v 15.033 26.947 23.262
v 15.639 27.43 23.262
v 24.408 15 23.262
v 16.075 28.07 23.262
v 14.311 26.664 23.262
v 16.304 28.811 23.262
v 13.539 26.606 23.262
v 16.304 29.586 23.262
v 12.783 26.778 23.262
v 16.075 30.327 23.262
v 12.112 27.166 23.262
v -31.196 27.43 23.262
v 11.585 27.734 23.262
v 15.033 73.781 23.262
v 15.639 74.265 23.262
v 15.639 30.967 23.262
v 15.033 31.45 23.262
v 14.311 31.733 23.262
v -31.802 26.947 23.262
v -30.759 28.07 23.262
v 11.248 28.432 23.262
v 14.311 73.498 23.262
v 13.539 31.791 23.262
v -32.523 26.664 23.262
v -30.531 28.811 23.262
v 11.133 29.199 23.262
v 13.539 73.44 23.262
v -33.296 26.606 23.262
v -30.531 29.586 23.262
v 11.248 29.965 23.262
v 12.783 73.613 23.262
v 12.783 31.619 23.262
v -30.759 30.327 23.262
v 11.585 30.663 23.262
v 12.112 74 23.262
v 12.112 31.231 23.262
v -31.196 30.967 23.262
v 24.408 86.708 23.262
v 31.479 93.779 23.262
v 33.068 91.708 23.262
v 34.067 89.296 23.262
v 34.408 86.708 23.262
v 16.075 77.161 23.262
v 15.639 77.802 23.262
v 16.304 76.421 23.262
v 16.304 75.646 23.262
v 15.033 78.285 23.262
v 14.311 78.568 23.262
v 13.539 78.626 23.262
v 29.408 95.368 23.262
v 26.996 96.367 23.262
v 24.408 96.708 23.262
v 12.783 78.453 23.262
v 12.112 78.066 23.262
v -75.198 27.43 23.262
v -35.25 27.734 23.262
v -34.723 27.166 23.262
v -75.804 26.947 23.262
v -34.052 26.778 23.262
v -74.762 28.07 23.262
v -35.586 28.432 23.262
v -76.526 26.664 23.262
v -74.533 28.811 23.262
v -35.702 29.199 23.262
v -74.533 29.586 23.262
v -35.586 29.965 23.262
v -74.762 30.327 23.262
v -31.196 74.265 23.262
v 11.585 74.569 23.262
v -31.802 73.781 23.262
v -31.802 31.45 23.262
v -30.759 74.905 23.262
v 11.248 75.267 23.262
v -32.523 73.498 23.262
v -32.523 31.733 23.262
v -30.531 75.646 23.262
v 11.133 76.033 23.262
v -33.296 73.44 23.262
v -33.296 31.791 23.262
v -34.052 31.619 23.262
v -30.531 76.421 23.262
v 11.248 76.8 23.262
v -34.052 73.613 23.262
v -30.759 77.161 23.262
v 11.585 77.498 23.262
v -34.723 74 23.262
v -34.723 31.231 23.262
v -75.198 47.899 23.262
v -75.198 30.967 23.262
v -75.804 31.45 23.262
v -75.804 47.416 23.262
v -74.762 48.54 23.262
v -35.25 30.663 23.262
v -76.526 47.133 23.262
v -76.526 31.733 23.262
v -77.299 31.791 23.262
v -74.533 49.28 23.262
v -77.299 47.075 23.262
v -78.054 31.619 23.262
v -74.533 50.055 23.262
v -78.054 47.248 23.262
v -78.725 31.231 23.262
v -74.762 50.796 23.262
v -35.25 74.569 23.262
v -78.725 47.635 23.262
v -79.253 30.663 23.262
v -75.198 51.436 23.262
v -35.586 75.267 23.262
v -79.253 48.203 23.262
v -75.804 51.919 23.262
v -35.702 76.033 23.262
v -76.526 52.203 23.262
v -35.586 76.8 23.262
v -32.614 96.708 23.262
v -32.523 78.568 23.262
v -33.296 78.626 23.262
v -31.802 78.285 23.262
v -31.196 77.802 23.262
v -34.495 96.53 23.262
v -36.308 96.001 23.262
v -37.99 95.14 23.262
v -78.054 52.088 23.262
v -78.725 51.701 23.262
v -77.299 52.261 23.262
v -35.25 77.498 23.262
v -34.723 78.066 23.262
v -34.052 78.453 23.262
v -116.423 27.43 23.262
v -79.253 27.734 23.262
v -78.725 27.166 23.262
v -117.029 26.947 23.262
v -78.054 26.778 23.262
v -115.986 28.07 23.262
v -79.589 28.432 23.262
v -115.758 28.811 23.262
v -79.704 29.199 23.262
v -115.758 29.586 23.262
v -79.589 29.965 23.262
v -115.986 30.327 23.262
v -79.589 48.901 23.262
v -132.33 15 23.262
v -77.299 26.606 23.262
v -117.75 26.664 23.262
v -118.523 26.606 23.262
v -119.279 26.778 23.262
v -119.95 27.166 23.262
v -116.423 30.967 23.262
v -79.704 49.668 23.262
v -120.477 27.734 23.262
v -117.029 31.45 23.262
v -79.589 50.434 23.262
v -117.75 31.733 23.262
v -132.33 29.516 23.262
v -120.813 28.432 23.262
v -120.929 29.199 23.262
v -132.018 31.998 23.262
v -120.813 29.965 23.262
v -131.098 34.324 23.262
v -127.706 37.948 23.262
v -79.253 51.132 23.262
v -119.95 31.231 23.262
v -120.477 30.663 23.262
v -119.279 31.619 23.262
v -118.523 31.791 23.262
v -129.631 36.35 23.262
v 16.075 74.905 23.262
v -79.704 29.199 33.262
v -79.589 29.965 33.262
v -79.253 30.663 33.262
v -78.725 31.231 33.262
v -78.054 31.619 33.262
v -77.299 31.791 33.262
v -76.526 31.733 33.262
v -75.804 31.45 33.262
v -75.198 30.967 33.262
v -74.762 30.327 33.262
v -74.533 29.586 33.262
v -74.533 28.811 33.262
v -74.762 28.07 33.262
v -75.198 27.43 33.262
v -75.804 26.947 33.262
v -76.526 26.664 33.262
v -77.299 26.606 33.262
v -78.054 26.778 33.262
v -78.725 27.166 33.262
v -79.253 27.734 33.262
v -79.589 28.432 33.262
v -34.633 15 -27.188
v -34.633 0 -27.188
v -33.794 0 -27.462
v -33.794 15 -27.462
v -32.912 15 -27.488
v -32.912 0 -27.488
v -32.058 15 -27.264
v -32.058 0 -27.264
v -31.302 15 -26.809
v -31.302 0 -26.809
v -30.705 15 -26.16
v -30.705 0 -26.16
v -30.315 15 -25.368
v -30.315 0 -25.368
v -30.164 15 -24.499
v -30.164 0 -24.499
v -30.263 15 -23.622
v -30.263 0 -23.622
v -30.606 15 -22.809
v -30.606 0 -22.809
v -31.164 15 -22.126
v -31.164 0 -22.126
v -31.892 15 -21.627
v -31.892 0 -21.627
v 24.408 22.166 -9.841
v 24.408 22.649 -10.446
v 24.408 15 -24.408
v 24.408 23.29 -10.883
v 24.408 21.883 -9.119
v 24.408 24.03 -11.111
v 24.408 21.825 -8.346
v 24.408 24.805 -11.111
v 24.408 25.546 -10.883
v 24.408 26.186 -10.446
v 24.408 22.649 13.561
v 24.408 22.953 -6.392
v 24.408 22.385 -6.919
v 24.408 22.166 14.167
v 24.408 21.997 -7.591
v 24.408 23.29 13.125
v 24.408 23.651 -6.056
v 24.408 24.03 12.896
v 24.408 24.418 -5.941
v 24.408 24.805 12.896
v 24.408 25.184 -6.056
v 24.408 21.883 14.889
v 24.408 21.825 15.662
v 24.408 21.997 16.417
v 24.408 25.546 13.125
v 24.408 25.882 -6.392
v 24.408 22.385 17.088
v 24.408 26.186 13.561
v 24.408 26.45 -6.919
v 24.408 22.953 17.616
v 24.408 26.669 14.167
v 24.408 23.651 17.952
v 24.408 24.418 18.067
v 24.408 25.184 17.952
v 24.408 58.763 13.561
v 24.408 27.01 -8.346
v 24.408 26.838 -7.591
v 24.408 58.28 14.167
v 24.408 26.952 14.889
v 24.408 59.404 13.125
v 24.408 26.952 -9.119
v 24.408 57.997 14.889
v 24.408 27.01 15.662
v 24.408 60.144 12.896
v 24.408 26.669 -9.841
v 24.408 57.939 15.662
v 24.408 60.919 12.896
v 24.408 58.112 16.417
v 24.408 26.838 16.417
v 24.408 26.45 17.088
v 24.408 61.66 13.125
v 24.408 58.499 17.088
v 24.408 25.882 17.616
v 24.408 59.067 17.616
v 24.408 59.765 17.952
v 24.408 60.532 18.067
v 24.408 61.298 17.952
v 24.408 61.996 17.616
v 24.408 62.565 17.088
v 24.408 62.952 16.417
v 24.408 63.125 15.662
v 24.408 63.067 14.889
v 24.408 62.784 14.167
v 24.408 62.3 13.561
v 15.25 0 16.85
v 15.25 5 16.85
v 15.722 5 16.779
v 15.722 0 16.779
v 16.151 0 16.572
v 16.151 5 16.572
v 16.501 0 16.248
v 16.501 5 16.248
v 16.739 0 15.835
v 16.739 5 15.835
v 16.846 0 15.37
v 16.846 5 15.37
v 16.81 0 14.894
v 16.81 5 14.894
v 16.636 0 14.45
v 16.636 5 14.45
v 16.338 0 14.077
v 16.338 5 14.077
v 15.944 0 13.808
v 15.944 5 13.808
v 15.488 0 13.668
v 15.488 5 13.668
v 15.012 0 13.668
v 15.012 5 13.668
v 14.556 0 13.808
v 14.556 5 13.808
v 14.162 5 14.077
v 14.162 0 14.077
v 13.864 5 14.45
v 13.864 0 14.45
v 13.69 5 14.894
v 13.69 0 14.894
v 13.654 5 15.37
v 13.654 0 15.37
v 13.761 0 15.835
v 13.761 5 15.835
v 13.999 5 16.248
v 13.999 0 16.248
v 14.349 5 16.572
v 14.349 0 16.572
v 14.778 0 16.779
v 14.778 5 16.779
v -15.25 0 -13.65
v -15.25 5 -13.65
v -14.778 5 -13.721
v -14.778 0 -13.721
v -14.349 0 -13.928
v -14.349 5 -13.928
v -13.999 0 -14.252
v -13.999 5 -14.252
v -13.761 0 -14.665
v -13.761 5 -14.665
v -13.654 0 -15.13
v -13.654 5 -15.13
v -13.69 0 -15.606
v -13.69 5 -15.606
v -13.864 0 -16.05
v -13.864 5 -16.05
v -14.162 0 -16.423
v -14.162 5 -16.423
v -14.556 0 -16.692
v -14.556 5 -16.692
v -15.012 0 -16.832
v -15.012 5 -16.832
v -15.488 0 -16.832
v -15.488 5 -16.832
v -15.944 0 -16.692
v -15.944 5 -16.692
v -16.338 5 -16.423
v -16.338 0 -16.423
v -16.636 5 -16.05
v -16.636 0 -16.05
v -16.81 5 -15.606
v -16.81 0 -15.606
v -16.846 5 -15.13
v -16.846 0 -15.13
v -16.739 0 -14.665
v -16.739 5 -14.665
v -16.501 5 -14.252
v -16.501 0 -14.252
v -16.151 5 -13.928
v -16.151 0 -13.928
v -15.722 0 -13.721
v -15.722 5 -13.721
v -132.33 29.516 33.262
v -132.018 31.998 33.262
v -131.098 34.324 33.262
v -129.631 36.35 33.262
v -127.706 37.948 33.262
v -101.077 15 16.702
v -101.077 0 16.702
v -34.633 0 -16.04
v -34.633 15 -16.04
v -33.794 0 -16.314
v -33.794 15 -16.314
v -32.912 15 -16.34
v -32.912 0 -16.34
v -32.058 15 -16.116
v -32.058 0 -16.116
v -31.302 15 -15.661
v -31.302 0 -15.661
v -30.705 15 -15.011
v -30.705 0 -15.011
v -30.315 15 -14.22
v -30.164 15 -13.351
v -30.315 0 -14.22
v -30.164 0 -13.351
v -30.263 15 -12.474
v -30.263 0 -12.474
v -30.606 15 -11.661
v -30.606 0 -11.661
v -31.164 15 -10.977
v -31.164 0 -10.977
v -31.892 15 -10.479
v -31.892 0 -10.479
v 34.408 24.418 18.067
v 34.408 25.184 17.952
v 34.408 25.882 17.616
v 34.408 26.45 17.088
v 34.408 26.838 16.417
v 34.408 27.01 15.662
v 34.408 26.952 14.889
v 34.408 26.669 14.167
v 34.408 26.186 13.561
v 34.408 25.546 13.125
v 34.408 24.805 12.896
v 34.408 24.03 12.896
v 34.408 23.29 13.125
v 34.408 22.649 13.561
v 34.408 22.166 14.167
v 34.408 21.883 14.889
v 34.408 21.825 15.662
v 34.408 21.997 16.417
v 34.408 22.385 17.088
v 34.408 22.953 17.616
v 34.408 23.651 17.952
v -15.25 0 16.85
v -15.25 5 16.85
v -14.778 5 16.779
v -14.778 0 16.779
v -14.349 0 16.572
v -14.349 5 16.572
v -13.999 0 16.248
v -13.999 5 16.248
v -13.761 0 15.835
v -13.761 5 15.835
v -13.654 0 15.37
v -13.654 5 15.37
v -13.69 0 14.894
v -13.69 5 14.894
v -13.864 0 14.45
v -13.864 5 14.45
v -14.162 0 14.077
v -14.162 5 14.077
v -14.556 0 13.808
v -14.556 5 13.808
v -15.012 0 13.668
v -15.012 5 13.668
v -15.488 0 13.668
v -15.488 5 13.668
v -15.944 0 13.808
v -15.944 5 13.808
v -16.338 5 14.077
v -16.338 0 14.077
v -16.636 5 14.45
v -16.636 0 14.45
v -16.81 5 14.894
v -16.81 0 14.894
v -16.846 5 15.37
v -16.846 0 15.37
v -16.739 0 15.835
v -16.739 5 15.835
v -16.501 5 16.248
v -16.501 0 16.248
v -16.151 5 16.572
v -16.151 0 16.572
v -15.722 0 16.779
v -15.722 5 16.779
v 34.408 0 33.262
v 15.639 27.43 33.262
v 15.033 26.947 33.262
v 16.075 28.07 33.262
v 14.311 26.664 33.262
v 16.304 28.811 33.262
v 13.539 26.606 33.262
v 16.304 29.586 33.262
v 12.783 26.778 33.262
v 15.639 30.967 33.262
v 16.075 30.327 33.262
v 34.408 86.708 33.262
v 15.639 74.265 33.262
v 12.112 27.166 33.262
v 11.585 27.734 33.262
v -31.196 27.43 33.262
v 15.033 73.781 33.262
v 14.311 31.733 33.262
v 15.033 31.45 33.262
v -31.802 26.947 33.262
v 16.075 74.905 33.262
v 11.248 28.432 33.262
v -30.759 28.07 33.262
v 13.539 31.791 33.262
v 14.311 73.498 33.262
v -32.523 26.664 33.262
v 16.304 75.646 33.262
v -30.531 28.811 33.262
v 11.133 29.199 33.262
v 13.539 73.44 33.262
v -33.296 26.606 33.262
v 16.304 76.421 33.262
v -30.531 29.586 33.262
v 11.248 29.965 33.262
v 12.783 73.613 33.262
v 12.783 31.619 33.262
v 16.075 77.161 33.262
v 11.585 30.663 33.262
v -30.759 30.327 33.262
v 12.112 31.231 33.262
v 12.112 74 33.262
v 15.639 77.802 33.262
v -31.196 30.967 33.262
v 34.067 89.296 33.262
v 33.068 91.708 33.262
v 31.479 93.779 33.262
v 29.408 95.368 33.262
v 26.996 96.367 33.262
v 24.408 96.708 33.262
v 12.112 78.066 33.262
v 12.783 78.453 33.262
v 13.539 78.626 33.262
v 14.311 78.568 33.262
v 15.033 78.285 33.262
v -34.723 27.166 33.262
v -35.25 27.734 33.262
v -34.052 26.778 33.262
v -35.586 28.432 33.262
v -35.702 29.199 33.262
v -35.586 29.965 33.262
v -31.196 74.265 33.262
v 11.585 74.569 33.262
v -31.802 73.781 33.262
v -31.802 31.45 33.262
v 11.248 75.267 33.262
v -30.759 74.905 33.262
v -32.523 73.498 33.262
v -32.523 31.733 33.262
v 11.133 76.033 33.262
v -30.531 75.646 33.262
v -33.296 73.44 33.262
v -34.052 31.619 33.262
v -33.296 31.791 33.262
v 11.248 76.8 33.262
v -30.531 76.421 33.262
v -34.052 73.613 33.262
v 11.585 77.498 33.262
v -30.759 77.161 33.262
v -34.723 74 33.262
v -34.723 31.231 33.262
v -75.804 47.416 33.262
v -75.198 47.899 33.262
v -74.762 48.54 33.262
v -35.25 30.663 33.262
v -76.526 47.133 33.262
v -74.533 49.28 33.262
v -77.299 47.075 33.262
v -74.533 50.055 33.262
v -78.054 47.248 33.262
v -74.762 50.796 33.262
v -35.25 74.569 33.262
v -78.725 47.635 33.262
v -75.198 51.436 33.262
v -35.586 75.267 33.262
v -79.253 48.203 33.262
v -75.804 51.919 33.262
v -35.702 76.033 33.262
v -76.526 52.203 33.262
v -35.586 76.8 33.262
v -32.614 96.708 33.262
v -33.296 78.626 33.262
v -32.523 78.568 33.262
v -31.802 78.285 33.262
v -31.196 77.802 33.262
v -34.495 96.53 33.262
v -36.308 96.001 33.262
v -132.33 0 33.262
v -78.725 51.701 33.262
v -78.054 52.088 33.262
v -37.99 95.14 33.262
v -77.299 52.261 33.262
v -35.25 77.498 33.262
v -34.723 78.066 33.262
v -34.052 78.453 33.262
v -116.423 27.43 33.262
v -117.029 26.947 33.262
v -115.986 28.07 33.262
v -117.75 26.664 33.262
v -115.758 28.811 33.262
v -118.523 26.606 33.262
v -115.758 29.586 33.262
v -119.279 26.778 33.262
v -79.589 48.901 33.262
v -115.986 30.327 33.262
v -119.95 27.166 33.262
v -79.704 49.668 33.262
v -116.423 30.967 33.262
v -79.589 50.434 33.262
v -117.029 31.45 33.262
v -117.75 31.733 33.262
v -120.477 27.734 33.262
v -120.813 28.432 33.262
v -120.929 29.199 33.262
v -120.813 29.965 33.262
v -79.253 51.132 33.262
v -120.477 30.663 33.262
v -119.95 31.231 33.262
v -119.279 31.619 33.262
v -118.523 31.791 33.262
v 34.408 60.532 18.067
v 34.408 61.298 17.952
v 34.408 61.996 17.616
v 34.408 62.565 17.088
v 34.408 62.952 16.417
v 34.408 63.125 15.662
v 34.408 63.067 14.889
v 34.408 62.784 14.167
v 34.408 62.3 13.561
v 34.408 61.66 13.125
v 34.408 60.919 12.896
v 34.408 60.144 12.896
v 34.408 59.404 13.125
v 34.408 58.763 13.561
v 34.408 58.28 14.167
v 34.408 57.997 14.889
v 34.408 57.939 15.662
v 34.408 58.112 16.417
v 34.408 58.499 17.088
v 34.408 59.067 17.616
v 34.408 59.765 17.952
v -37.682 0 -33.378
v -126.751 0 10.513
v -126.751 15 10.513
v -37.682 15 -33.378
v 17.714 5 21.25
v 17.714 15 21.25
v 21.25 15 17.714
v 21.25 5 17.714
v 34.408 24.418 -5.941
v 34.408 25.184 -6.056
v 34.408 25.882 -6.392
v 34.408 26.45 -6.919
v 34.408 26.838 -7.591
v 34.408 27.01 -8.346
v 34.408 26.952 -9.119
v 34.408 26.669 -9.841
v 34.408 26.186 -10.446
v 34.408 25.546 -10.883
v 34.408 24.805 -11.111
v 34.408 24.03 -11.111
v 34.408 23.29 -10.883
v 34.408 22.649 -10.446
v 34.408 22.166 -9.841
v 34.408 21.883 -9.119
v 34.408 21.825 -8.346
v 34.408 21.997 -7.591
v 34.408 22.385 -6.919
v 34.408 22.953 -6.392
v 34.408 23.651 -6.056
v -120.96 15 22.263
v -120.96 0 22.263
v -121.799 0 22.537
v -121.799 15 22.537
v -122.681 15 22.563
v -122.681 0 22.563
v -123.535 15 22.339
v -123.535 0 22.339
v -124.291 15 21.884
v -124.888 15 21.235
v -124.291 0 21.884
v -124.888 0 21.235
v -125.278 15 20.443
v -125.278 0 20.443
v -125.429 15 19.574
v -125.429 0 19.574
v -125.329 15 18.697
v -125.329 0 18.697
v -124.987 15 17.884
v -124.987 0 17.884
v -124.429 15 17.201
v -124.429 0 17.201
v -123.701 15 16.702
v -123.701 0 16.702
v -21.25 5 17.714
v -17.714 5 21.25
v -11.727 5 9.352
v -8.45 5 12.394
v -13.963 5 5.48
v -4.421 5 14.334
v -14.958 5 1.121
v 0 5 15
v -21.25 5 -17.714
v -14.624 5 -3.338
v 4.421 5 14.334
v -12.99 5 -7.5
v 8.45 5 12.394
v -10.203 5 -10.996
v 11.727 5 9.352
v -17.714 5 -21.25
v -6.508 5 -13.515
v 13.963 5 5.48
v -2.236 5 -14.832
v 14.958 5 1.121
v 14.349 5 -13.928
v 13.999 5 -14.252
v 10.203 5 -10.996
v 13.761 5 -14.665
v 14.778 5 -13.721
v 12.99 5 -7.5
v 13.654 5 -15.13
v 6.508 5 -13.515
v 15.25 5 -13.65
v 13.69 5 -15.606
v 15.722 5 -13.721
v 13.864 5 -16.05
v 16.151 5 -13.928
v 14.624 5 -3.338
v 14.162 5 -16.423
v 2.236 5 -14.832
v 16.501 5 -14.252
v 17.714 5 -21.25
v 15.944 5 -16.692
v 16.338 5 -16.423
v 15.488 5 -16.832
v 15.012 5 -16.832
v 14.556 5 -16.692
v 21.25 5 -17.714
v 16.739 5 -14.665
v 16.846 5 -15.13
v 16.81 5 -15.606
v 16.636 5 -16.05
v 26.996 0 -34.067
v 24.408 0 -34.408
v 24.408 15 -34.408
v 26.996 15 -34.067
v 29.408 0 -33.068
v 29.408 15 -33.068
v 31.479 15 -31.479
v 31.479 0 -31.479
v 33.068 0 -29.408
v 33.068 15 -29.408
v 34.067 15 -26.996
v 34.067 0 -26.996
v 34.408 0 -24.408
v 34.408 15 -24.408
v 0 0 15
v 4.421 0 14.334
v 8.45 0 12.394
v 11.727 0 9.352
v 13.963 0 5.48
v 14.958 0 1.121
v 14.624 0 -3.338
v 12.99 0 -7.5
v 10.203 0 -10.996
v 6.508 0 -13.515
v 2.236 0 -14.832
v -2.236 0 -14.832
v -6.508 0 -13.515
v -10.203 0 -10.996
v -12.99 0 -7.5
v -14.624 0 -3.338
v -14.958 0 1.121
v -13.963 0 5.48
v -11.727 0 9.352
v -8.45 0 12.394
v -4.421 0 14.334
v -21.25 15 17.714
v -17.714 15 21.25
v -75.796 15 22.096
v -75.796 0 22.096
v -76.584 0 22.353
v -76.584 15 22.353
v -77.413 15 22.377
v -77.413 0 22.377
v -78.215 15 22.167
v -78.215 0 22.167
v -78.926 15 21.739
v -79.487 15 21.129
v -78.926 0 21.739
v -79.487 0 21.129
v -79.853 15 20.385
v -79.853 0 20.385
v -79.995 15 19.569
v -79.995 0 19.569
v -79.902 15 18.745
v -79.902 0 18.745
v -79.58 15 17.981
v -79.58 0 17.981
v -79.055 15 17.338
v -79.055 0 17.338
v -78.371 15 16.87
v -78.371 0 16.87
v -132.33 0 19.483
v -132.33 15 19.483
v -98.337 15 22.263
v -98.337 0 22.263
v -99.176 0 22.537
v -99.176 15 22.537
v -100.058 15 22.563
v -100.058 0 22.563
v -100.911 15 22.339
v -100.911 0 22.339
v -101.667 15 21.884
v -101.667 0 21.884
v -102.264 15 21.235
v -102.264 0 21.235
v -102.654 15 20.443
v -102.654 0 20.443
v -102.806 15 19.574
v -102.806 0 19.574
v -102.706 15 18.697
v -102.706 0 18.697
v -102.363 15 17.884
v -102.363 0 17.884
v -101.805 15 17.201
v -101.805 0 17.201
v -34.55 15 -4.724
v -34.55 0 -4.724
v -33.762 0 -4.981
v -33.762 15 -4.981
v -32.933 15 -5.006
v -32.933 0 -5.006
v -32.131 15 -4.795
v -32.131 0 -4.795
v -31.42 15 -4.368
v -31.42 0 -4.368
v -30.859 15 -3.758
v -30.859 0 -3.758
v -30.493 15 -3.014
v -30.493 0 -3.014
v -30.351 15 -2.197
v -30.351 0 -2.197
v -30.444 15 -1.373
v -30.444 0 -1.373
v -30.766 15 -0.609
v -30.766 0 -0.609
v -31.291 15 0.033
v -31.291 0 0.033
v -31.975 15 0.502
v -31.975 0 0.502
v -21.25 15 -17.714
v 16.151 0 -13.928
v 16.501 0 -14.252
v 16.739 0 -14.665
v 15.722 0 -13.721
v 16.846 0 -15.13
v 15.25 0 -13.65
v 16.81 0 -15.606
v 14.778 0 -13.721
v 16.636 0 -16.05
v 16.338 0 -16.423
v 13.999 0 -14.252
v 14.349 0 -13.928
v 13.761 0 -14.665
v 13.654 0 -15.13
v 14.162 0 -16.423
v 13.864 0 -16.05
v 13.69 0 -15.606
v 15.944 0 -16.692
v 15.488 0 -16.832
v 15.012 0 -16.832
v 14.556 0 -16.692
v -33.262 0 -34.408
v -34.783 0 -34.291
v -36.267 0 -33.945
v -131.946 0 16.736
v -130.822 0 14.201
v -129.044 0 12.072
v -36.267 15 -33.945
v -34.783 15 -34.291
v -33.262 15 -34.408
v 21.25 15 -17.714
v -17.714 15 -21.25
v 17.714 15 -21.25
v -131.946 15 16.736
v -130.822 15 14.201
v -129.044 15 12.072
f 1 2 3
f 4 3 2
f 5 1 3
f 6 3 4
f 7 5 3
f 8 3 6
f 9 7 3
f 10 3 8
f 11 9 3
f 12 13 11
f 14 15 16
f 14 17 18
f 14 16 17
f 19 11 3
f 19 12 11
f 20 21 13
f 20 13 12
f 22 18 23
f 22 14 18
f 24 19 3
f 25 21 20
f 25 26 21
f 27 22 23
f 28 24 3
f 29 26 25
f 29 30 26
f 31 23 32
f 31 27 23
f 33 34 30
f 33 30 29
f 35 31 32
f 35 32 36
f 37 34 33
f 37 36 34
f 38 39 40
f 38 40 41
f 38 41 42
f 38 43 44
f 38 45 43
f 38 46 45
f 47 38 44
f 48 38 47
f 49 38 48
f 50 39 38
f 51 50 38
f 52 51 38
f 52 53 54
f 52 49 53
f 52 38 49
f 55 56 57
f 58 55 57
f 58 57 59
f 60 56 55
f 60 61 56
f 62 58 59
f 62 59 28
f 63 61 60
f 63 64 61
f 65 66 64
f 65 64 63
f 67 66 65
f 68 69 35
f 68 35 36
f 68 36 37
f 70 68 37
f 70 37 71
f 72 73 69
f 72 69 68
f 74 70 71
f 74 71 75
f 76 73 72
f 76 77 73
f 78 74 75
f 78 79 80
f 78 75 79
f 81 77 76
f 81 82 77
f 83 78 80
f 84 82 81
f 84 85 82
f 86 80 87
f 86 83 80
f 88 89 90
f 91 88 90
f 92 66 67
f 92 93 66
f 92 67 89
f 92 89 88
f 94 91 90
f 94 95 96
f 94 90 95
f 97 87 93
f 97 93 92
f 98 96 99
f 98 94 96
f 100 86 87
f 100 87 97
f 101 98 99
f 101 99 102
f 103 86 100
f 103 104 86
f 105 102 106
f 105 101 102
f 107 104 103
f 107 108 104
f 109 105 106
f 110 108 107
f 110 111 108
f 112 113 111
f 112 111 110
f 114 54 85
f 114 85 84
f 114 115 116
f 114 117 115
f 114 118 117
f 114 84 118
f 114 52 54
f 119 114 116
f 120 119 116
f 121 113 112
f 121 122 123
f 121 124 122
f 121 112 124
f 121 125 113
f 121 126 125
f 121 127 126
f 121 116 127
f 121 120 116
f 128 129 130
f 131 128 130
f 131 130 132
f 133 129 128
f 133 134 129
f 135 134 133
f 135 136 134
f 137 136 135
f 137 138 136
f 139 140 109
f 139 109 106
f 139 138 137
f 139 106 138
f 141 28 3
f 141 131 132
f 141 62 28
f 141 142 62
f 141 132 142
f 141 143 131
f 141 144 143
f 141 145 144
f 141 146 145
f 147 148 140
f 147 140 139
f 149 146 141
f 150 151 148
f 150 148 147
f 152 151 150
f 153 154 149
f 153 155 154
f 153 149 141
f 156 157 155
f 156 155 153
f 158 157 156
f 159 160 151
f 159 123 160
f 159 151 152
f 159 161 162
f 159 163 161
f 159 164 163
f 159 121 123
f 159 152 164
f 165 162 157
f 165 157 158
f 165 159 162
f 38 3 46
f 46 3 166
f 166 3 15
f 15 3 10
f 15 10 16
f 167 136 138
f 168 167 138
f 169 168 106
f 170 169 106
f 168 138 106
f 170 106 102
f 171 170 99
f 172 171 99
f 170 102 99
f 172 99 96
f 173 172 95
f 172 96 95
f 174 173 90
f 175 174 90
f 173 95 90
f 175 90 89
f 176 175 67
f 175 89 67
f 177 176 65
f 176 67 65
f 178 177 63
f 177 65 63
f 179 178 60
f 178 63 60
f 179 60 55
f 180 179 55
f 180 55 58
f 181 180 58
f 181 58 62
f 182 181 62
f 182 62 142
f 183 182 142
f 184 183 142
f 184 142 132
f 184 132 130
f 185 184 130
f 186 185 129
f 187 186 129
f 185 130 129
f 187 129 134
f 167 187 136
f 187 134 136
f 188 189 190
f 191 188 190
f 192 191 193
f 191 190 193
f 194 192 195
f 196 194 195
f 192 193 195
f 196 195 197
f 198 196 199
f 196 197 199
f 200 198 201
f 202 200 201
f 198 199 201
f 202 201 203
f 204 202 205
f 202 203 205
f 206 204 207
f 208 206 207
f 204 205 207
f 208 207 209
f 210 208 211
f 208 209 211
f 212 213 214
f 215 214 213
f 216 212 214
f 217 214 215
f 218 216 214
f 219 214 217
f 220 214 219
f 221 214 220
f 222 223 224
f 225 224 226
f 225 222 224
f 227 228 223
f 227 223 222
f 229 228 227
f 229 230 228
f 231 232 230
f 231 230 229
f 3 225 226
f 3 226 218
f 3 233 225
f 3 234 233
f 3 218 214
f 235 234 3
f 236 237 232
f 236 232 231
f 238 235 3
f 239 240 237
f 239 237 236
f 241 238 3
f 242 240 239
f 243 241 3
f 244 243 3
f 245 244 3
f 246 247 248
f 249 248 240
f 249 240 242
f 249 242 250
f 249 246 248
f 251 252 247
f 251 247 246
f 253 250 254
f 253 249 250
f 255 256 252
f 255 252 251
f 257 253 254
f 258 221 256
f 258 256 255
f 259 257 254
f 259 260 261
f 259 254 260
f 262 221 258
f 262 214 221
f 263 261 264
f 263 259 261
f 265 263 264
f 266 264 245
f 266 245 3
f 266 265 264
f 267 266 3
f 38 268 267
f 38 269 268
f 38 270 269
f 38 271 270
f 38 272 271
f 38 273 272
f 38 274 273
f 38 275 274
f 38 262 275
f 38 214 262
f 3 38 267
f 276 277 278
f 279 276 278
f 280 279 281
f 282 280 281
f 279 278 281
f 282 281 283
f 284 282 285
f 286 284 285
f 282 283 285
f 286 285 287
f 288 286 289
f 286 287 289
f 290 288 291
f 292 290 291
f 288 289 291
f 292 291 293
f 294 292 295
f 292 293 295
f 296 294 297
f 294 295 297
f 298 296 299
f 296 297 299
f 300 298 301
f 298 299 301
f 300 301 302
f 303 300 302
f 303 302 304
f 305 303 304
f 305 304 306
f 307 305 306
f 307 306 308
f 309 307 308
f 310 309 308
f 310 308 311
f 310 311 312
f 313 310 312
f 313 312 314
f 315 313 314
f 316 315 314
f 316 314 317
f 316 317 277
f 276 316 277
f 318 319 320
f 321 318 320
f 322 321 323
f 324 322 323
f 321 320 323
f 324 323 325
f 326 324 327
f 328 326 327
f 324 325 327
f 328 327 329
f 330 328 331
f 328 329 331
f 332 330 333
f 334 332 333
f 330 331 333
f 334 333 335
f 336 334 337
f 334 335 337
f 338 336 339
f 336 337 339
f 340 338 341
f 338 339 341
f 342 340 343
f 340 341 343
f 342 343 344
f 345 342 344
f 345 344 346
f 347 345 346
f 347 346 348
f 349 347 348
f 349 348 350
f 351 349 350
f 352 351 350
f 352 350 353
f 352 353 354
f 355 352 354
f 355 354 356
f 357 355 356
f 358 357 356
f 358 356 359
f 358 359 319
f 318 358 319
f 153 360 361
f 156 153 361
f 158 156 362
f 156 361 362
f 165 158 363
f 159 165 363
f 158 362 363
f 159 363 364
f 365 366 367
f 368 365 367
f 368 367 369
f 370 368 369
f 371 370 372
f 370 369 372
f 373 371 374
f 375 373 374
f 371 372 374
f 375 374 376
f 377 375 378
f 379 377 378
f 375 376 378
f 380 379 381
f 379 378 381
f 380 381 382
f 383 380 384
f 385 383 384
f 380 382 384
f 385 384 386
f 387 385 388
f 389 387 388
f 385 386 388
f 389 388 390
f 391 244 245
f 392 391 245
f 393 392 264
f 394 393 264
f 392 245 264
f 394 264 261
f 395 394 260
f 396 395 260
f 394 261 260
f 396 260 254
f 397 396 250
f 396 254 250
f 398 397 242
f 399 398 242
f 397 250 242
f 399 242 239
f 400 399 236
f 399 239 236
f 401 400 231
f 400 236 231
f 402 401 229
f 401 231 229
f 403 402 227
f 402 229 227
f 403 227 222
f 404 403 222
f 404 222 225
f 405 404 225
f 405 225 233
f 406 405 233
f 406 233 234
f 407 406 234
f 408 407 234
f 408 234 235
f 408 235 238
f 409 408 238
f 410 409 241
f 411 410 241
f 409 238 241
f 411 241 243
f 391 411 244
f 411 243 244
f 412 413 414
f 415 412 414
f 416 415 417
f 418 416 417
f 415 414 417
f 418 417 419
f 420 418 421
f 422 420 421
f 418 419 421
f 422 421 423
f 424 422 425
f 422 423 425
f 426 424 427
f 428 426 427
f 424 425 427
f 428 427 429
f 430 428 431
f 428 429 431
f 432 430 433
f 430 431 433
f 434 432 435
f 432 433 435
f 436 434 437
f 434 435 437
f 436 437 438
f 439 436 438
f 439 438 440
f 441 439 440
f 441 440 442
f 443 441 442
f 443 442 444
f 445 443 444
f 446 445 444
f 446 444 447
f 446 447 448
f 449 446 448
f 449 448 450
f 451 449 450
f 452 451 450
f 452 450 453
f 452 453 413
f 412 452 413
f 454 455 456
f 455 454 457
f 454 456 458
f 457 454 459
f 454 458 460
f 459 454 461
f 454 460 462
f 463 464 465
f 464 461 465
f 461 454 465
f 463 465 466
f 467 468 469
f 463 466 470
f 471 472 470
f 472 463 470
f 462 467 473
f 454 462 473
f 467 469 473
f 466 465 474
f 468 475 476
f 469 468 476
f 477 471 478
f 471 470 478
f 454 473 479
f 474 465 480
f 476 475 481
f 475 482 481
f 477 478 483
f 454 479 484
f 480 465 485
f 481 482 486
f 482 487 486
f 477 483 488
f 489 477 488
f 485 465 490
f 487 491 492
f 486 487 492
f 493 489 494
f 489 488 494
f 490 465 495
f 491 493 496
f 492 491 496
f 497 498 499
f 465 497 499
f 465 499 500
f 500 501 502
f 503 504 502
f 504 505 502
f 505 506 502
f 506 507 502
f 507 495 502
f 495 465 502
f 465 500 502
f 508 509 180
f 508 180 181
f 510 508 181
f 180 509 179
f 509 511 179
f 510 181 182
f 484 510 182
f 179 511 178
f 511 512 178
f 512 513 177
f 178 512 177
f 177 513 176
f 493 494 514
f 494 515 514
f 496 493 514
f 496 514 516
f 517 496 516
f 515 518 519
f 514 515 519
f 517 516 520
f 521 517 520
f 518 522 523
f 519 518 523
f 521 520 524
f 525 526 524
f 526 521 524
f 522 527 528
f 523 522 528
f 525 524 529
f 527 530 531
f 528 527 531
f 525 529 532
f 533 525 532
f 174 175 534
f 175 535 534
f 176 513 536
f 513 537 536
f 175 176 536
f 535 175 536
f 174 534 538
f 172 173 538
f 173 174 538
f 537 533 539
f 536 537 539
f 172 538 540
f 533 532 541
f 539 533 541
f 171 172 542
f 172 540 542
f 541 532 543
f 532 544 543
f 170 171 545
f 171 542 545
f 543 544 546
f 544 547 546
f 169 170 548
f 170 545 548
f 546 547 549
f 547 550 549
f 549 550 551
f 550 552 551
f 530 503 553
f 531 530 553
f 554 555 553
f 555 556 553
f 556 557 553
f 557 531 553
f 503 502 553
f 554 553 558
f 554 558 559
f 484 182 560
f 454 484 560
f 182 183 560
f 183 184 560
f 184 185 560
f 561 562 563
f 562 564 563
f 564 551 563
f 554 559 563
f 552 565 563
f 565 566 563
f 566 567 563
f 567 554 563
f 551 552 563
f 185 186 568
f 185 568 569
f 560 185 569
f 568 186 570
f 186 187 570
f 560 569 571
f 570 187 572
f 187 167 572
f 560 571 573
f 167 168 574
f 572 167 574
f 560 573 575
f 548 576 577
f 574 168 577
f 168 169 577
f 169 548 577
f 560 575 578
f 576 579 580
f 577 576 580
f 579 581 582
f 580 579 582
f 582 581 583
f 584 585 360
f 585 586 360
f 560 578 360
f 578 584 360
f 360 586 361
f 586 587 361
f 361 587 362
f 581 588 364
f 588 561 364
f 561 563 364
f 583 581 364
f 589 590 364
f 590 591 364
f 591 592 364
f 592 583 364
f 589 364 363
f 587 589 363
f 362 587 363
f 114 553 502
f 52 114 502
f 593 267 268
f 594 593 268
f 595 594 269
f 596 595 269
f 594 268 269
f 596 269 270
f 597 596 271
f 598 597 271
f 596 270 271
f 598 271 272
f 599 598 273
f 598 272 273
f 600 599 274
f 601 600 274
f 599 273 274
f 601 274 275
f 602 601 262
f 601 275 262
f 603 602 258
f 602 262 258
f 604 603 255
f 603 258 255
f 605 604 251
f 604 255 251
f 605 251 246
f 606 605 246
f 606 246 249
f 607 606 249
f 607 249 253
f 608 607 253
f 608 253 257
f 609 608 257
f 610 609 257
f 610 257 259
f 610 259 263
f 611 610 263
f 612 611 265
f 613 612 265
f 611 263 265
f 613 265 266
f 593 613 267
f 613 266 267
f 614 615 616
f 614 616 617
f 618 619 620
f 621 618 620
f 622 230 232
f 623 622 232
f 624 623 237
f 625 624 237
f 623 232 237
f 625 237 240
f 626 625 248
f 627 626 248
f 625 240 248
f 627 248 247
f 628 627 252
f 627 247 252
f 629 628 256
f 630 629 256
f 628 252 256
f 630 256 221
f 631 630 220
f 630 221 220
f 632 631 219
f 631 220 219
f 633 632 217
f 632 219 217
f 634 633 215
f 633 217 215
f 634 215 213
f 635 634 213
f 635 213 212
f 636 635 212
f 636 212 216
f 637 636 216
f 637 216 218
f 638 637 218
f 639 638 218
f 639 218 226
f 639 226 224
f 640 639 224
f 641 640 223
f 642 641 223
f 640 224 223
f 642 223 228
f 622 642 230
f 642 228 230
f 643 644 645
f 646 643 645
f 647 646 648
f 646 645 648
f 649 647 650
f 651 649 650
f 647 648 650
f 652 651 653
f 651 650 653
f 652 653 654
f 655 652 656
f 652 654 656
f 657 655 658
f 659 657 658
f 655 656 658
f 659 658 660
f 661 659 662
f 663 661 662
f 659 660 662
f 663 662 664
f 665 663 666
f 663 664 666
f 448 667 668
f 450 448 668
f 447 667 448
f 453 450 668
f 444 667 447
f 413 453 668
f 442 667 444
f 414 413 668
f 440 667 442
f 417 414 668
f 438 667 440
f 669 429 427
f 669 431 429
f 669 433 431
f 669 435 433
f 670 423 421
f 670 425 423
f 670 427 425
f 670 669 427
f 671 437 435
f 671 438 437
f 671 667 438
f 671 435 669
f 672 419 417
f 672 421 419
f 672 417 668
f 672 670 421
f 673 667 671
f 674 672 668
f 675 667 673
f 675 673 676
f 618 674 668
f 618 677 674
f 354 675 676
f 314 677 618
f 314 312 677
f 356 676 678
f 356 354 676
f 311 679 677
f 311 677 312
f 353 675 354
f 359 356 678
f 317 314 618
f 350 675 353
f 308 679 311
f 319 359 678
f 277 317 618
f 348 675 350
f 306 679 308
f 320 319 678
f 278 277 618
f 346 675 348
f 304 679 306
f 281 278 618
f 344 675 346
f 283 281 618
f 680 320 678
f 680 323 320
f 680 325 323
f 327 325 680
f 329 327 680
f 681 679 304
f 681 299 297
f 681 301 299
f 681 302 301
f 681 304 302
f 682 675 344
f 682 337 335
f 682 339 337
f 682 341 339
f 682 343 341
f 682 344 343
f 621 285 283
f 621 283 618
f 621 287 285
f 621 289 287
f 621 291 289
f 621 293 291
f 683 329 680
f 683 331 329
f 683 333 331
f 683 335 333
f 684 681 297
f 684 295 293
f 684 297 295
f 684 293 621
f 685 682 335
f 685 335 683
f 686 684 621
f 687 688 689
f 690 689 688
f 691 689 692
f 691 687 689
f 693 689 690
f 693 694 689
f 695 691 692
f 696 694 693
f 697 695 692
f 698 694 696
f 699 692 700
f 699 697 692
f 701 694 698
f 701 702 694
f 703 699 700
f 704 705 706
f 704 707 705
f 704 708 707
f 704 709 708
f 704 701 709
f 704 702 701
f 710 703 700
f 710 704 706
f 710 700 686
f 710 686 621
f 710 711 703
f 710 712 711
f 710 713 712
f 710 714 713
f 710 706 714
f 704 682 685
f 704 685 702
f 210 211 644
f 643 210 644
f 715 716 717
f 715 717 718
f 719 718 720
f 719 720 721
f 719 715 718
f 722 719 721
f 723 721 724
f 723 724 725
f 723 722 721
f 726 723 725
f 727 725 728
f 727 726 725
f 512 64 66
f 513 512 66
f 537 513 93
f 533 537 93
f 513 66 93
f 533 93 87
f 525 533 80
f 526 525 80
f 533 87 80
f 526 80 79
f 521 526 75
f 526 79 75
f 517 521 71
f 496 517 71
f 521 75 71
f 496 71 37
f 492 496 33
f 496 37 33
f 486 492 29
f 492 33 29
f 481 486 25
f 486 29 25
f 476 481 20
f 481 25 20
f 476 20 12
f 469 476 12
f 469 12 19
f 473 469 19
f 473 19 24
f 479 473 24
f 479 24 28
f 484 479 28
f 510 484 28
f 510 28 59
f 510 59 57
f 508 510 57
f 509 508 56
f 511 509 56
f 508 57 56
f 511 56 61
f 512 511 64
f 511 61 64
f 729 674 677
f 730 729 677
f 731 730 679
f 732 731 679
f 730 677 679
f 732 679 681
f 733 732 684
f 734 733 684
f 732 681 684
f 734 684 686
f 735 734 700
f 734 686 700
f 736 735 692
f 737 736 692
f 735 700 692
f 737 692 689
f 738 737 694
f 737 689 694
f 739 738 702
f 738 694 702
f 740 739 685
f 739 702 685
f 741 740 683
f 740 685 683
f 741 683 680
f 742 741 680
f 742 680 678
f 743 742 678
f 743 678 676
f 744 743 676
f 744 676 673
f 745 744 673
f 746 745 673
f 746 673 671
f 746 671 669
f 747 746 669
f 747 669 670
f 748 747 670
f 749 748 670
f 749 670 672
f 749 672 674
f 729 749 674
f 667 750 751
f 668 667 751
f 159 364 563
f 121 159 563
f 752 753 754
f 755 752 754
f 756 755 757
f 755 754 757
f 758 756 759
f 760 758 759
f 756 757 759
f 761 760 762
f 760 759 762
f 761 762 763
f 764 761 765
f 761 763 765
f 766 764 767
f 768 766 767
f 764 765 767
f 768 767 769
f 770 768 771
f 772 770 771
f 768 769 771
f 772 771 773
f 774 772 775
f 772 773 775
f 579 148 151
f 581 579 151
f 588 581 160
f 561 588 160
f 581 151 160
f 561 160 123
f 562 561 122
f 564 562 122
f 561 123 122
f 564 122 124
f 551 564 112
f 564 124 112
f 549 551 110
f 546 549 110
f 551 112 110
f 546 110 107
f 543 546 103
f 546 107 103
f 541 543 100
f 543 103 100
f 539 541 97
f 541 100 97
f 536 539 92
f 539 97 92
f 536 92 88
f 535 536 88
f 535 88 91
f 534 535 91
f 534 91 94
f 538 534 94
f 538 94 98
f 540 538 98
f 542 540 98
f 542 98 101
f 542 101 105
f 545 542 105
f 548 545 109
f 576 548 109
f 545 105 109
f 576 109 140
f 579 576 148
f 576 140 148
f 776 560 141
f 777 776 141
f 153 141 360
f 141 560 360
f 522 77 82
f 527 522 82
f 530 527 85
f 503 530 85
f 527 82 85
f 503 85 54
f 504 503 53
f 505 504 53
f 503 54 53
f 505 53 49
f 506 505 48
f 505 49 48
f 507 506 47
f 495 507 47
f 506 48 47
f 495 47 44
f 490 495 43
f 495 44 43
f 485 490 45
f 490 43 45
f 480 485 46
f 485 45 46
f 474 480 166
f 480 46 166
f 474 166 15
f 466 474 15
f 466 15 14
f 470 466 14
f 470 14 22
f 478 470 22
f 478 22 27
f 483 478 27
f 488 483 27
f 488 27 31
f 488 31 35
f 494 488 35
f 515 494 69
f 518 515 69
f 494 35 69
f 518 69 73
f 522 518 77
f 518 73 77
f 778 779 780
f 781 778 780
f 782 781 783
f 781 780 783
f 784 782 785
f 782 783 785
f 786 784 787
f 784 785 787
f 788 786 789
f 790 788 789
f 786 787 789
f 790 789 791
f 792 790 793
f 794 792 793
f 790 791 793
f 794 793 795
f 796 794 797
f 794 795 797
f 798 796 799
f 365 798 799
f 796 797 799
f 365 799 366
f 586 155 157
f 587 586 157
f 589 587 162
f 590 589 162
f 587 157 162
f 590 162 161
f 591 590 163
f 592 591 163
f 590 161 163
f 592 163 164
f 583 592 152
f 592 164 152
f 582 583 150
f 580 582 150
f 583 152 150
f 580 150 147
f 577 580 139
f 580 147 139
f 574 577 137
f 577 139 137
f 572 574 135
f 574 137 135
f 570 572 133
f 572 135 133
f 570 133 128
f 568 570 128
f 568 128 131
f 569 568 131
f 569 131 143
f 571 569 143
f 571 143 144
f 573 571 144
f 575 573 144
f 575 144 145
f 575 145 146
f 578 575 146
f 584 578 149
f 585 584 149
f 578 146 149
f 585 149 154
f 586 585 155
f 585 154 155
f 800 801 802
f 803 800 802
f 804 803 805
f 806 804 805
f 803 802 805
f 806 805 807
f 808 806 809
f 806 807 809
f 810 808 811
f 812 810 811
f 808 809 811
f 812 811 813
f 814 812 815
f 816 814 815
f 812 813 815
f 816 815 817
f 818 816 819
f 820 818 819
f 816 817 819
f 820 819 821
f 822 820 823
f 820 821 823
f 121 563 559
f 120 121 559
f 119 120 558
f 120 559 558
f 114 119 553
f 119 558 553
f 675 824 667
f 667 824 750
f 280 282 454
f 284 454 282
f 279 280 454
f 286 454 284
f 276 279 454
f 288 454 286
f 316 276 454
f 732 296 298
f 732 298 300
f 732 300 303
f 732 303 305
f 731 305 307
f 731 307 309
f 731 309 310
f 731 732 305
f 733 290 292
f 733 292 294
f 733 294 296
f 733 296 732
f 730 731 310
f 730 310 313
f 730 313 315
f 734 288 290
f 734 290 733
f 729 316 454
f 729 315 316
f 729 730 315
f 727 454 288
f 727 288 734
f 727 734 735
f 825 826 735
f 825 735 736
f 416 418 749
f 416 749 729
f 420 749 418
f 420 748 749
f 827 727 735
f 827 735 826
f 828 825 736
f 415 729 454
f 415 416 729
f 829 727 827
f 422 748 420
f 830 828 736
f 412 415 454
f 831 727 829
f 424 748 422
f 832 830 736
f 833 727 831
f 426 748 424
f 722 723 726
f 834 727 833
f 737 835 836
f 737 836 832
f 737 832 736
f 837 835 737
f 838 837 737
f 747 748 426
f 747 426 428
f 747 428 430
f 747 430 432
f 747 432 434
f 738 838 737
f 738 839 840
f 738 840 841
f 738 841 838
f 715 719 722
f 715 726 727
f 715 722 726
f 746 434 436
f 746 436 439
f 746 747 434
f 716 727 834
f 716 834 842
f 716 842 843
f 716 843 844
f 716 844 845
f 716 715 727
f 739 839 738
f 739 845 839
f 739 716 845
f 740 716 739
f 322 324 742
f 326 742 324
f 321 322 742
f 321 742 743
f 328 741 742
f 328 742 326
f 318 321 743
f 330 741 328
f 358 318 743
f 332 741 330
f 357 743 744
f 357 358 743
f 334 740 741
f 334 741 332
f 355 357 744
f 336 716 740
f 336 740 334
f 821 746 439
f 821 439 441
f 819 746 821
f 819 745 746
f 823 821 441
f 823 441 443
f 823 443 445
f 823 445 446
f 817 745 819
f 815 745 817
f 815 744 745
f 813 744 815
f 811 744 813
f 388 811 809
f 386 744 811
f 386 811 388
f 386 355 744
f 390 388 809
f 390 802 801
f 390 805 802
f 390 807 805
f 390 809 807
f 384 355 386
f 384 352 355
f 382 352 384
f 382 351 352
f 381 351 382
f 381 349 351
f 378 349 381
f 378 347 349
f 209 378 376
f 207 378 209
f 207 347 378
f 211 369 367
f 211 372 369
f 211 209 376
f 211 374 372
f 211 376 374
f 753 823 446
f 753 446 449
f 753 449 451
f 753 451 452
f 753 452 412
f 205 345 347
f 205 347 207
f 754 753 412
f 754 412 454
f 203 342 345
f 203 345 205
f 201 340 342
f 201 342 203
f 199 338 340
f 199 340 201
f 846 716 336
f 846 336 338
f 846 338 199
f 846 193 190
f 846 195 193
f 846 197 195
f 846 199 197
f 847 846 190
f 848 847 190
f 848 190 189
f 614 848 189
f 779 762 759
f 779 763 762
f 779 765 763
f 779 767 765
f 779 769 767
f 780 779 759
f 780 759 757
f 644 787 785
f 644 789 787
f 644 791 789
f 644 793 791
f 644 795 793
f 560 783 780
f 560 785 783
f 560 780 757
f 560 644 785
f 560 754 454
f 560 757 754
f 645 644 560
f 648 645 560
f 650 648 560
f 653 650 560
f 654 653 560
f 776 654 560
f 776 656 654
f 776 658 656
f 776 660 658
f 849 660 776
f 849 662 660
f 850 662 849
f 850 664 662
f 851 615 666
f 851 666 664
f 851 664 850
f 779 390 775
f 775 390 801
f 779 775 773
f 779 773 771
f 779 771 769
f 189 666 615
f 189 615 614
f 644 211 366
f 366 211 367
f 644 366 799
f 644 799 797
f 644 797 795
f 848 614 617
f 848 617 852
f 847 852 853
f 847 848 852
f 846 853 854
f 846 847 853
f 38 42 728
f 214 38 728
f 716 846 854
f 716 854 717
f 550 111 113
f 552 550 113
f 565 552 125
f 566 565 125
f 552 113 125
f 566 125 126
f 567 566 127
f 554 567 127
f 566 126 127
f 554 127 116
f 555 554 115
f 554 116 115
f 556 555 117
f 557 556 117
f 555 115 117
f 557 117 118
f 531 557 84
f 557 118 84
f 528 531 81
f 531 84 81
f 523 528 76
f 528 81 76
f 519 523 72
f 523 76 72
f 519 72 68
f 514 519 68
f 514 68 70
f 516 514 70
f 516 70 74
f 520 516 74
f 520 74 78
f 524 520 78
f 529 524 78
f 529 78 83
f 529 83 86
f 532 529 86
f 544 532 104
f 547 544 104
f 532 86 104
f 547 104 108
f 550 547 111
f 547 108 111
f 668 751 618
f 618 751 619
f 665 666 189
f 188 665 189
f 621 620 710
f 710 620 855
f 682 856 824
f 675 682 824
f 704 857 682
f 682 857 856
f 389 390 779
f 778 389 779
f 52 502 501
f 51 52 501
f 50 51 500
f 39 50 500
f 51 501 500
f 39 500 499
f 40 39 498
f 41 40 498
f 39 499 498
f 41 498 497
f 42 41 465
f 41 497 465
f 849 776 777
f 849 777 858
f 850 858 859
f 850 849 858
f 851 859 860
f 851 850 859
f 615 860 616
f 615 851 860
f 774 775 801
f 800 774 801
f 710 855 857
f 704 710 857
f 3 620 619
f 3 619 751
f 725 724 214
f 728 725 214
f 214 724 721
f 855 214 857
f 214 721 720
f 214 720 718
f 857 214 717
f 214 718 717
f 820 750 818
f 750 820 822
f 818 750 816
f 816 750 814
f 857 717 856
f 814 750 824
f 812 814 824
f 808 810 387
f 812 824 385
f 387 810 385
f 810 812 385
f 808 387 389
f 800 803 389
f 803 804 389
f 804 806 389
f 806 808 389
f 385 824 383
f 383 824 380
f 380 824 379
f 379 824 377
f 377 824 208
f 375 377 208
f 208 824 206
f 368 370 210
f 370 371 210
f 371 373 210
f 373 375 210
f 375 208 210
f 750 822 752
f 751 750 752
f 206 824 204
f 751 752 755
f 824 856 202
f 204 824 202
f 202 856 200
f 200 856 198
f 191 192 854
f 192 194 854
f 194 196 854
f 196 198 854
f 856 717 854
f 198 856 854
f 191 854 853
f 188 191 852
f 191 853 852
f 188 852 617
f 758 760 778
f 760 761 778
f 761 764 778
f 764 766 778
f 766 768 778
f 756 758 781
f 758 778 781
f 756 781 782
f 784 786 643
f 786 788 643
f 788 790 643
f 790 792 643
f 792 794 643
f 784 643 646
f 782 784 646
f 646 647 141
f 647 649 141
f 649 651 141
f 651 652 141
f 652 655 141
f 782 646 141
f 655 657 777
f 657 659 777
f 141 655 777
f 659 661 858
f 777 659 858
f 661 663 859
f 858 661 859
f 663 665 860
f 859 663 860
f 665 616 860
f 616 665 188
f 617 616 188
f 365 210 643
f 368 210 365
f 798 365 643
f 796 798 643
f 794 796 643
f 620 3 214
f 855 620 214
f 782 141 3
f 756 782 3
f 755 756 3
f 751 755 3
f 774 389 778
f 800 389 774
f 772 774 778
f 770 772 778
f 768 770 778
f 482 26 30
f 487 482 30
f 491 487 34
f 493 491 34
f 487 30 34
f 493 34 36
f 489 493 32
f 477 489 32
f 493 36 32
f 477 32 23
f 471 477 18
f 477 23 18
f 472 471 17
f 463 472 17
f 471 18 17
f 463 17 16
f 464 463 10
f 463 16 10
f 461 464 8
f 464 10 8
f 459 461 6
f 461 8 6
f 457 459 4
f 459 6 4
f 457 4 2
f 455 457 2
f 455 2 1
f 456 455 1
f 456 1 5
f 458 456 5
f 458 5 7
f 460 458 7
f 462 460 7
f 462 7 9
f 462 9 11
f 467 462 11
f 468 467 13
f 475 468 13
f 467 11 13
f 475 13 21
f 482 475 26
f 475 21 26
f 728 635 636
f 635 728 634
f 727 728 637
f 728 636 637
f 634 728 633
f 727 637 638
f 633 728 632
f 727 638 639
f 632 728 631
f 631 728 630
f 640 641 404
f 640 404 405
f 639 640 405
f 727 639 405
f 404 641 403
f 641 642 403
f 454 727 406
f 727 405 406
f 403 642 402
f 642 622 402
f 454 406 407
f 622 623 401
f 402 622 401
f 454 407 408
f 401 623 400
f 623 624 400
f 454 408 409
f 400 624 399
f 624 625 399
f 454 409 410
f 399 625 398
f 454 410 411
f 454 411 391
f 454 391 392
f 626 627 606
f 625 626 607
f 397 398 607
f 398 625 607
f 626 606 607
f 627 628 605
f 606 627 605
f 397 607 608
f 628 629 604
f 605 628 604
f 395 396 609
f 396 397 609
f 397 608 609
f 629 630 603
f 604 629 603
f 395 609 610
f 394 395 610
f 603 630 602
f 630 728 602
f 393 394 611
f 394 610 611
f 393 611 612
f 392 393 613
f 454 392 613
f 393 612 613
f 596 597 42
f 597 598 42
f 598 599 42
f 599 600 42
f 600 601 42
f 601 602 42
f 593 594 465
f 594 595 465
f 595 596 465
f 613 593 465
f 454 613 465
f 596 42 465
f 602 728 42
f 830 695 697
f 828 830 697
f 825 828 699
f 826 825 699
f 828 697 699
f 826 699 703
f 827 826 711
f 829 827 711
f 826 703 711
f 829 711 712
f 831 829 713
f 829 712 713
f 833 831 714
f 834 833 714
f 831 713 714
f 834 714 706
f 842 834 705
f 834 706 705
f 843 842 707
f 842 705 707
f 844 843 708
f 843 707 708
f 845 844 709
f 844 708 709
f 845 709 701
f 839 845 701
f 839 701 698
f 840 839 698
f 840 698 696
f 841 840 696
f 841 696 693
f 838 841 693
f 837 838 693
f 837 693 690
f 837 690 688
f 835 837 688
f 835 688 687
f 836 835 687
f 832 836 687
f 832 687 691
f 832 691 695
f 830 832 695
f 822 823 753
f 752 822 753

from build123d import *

# Parameters (mm, degrees)
BOSS_EXTRUDE1_DEPTH = 15
CUT_EXTRUDE1_DEPTH  = 10
SKETCH4_R           = 15
SKETCH4_R_2         = 1.6
CUT_EXTRUDE2_DEPTH  = 10
BOSS_EXTRUDE2_DEPTH = 10
BOSS_EXTRUDE3_DEPTH = 10
SKETCH7_R           = 2.6
CUT_EXTRUDE3_DEPTH  = 10
SKETCH8_R           = 2.6
CUT_EXTRUDE4_DEPTH  = 10


with BuildPart() as part:
    # Sketch1 → Boss-Extrude1 (new body)
    with BuildSketch(Plane(origin=(0, 0, 0), x_dir=(1, 0, 0), z_dir=(0, 1, 0))):
        with BuildLine():
            Line((-33.262289521, -33.262289521), (-132.330467636, -33.262289521))
            Line((-132.330467636, -33.262289521), (-132.330467636, -19.482767229))
            ThreePointArc((-132.330467636, -19.482767229), (-130.821698058, -14.200816273), (-126.750666454, -10.512714699))
            Line((-126.750666454, -10.512714699), (-37.682488339, 33.377669927))
            ThreePointArc((-37.682488339, 33.377669927), (-35.531592794, 34.146727348), (-33.262289521, 34.407617396))
            Line((-33.262289521, 34.407617396), (24.407617396, 34.407617396))
            ThreePointArc((24.407617396, 34.407617396), (31.478685208, 31.478685208), (34.407617396, 24.407617396))
            Line((34.407617396, 24.407617396), (34.407617396, -33.262289521))
            Line((34.407617396, -33.262289521), (-33.262289521, -33.262289521))
        make_face()
        with BuildLine():
            Line((-31.892027887, 10.478694381), (-98.33678925, -22.263483514))
            ThreePointArc((-98.33678925, -22.263483514), (-102.487767169, -20.853028863), (-101.077312518, -16.702050945))
            Line((-101.077312518, -16.702050945), (-34.632551154, 16.04012695))
            ThreePointArc((-34.632551154, 16.04012695), (-30.481573236, 14.629672299), (-31.892027887, 10.478694381))
        make_face(mode=Mode.SUBTRACT)
        with BuildLine():
            Line((-123.700729269, -16.702050945), (-34.632551154, 27.188333681))
            ThreePointArc((-34.632551154, 27.188333681), (-30.481573236, 25.77787903), (-31.892027887, 21.626901112))
            Line((-31.892027887, 21.626901112), (-120.960206002, -22.263483514))
            ThreePointArc((-120.960206002, -22.263483514), (-125.11118392, -20.853028863), (-123.700729269, -16.702050945))
        make_face(mode=Mode.SUBTRACT)
        with BuildLine():
            Line((-78.371246836, -16.869773094), (-34.549902224, 4.72419807))
            ThreePointArc((-34.549902224, 4.72419807), (-30.649295385, 3.398816638), (-31.974676817, -0.501790201))
            Line((-31.974676817, -0.501790201), (-75.796021429, -22.095761365))
            ThreePointArc((-75.796021429, -22.095761365), (-79.696628268, -20.770379933), (-78.371246836, -16.869773094))
        make_face(mode=Mode.SUBTRACT)
    extrude(amount=BOSS_EXTRUDE1_DEPTH)

    # Sketch2 → Cut-Extrude1 (cut)
    with BuildSketch(Plane(origin=(0, 15, 0), x_dir=(1, 0, 0), z_dir=(0, 1, 0))):
        Polygon((-17.714466094, 21.25), (-21.25, 17.714466094), (-21.25, -17.714466094), (-17.714466094, -21.25), (17.714466094, -21.25), (21.25, -17.714466094), (21.25, 17.714466094), (17.714466094, 21.25), align=None)
    extrude(amount=-CUT_EXTRUDE1_DEPTH, mode=Mode.SUBTRACT)

    # Sketch4 → Cut-Extrude2 (cut)
    with BuildSketch(Plane(origin=(0, 5, 0), x_dir=(1, 0, 0), z_dir=(0, 1, 0))):
        with Locations(Location((0, 0, 0), (0, 0, 270))):
            Circle(SKETCH4_R)
        with Locations(Location((-15.25, -15.25, 0), (0, 0, 270))):
            Circle(SKETCH4_R_2)
        with Locations(Location((-15.25, 15.25, 0), (0, 0, 270))):
            Circle(SKETCH4_R_2)
        with Locations(Location((15.25, 15.25, 0), (0, 0, 270))):
            Circle(SKETCH4_R_2)
        with Locations(Location((15.25, -15.25, 0), (0, 0, 270))):
            Circle(SKETCH4_R_2)
    extrude(amount=-CUT_EXTRUDE2_DEPTH, mode=Mode.SUBTRACT)

    # Sketch5 → Boss-Extrude2 (add)
    with BuildSketch(Plane.XY.offset(33.262289521)):
        with BuildLine():
            Line((-132.330467636, 15), (-132.330467636, 29.515702772))
            ThreePointArc((-132.330467636, 29.515702772), (-131.098434148, 34.324316216), (-127.705914986, 37.9480551))
            Line((-127.705914986, 37.9480551), (-37.989603896, 95.140317474))
            ThreePointArc((-37.989603896, 95.140317474), (-35.41384195, 96.308056898), (-32.614156546, 96.707965146))
            Line((-32.614156546, 96.707965146), (24.407617396, 96.707965146))
            ThreePointArc((24.407617396, 96.707965146), (31.478685208, 93.779032958), (34.407617396, 86.707965146))
            Line((34.407617396, 86.707965146), (34.407617396, 15))
            Line((34.407617396, 15), (-132.330467636, 15))
        make_face()
    extrude(amount=-BOSS_EXTRUDE2_DEPTH)

    # Sketch6 → Boss-Extrude3 (add)
    with BuildSketch(Plane(origin=(34.407617396, 0, 0), x_dir=(0, 0, -1), z_dir=(1, 0, 0))):
        Polygon((-23.262289521, 86.707965146), (24.407617396, 15), (-23.262289521, 15), align=None)
    extrude(amount=-BOSS_EXTRUDE3_DEPTH)

    # Sketch7 → Cut-Extrude3 (cut)
    with BuildSketch(Plane(origin=(0, 0, 23.262289521), x_dir=(-1, 0, 0), z_dir=(0, 0, -1))):
        with Locations((-13.732807518, 76.033155267)):
            Circle(SKETCH7_R)
        with Locations((33.101778739, 29.198569011)):
            Circle(SKETCH7_R)
        with Locations((33.101778739, 76.033155267)):
            Circle(SKETCH7_R)
        with Locations((-13.732807518, 29.198569011)):
            Circle(SKETCH7_R)
        with Locations((118.329007759, 29.198569011)):
            Circle(SKETCH7_R)
        with Locations((77.104397796, 29.198569011)):
            Circle(SKETCH7_R)
        with Locations((77.104397796, 49.667805409)):
            Circle(SKETCH7_R)
    extrude(amount=-CUT_EXTRUDE3_DEPTH, mode=Mode.SUBTRACT)

    # Sketch8 → Cut-Extrude4 (cut)
    with BuildSketch(Plane.ZY.offset(-24.407617396)):
        with Locations((15.467402897, 24.417657132)):
            Circle(SKETCH8_R)
        with Locations((15.467402897, 60.531845861)):
            Circle(SKETCH8_R)
        with Locations((-8.540529995, 24.417657132)):
            Circle(SKETCH8_R)
    extrude(amount=-CUT_EXTRUDE4_DEPTH, mode=Mode.SUBTRACT)


solid = part.part
